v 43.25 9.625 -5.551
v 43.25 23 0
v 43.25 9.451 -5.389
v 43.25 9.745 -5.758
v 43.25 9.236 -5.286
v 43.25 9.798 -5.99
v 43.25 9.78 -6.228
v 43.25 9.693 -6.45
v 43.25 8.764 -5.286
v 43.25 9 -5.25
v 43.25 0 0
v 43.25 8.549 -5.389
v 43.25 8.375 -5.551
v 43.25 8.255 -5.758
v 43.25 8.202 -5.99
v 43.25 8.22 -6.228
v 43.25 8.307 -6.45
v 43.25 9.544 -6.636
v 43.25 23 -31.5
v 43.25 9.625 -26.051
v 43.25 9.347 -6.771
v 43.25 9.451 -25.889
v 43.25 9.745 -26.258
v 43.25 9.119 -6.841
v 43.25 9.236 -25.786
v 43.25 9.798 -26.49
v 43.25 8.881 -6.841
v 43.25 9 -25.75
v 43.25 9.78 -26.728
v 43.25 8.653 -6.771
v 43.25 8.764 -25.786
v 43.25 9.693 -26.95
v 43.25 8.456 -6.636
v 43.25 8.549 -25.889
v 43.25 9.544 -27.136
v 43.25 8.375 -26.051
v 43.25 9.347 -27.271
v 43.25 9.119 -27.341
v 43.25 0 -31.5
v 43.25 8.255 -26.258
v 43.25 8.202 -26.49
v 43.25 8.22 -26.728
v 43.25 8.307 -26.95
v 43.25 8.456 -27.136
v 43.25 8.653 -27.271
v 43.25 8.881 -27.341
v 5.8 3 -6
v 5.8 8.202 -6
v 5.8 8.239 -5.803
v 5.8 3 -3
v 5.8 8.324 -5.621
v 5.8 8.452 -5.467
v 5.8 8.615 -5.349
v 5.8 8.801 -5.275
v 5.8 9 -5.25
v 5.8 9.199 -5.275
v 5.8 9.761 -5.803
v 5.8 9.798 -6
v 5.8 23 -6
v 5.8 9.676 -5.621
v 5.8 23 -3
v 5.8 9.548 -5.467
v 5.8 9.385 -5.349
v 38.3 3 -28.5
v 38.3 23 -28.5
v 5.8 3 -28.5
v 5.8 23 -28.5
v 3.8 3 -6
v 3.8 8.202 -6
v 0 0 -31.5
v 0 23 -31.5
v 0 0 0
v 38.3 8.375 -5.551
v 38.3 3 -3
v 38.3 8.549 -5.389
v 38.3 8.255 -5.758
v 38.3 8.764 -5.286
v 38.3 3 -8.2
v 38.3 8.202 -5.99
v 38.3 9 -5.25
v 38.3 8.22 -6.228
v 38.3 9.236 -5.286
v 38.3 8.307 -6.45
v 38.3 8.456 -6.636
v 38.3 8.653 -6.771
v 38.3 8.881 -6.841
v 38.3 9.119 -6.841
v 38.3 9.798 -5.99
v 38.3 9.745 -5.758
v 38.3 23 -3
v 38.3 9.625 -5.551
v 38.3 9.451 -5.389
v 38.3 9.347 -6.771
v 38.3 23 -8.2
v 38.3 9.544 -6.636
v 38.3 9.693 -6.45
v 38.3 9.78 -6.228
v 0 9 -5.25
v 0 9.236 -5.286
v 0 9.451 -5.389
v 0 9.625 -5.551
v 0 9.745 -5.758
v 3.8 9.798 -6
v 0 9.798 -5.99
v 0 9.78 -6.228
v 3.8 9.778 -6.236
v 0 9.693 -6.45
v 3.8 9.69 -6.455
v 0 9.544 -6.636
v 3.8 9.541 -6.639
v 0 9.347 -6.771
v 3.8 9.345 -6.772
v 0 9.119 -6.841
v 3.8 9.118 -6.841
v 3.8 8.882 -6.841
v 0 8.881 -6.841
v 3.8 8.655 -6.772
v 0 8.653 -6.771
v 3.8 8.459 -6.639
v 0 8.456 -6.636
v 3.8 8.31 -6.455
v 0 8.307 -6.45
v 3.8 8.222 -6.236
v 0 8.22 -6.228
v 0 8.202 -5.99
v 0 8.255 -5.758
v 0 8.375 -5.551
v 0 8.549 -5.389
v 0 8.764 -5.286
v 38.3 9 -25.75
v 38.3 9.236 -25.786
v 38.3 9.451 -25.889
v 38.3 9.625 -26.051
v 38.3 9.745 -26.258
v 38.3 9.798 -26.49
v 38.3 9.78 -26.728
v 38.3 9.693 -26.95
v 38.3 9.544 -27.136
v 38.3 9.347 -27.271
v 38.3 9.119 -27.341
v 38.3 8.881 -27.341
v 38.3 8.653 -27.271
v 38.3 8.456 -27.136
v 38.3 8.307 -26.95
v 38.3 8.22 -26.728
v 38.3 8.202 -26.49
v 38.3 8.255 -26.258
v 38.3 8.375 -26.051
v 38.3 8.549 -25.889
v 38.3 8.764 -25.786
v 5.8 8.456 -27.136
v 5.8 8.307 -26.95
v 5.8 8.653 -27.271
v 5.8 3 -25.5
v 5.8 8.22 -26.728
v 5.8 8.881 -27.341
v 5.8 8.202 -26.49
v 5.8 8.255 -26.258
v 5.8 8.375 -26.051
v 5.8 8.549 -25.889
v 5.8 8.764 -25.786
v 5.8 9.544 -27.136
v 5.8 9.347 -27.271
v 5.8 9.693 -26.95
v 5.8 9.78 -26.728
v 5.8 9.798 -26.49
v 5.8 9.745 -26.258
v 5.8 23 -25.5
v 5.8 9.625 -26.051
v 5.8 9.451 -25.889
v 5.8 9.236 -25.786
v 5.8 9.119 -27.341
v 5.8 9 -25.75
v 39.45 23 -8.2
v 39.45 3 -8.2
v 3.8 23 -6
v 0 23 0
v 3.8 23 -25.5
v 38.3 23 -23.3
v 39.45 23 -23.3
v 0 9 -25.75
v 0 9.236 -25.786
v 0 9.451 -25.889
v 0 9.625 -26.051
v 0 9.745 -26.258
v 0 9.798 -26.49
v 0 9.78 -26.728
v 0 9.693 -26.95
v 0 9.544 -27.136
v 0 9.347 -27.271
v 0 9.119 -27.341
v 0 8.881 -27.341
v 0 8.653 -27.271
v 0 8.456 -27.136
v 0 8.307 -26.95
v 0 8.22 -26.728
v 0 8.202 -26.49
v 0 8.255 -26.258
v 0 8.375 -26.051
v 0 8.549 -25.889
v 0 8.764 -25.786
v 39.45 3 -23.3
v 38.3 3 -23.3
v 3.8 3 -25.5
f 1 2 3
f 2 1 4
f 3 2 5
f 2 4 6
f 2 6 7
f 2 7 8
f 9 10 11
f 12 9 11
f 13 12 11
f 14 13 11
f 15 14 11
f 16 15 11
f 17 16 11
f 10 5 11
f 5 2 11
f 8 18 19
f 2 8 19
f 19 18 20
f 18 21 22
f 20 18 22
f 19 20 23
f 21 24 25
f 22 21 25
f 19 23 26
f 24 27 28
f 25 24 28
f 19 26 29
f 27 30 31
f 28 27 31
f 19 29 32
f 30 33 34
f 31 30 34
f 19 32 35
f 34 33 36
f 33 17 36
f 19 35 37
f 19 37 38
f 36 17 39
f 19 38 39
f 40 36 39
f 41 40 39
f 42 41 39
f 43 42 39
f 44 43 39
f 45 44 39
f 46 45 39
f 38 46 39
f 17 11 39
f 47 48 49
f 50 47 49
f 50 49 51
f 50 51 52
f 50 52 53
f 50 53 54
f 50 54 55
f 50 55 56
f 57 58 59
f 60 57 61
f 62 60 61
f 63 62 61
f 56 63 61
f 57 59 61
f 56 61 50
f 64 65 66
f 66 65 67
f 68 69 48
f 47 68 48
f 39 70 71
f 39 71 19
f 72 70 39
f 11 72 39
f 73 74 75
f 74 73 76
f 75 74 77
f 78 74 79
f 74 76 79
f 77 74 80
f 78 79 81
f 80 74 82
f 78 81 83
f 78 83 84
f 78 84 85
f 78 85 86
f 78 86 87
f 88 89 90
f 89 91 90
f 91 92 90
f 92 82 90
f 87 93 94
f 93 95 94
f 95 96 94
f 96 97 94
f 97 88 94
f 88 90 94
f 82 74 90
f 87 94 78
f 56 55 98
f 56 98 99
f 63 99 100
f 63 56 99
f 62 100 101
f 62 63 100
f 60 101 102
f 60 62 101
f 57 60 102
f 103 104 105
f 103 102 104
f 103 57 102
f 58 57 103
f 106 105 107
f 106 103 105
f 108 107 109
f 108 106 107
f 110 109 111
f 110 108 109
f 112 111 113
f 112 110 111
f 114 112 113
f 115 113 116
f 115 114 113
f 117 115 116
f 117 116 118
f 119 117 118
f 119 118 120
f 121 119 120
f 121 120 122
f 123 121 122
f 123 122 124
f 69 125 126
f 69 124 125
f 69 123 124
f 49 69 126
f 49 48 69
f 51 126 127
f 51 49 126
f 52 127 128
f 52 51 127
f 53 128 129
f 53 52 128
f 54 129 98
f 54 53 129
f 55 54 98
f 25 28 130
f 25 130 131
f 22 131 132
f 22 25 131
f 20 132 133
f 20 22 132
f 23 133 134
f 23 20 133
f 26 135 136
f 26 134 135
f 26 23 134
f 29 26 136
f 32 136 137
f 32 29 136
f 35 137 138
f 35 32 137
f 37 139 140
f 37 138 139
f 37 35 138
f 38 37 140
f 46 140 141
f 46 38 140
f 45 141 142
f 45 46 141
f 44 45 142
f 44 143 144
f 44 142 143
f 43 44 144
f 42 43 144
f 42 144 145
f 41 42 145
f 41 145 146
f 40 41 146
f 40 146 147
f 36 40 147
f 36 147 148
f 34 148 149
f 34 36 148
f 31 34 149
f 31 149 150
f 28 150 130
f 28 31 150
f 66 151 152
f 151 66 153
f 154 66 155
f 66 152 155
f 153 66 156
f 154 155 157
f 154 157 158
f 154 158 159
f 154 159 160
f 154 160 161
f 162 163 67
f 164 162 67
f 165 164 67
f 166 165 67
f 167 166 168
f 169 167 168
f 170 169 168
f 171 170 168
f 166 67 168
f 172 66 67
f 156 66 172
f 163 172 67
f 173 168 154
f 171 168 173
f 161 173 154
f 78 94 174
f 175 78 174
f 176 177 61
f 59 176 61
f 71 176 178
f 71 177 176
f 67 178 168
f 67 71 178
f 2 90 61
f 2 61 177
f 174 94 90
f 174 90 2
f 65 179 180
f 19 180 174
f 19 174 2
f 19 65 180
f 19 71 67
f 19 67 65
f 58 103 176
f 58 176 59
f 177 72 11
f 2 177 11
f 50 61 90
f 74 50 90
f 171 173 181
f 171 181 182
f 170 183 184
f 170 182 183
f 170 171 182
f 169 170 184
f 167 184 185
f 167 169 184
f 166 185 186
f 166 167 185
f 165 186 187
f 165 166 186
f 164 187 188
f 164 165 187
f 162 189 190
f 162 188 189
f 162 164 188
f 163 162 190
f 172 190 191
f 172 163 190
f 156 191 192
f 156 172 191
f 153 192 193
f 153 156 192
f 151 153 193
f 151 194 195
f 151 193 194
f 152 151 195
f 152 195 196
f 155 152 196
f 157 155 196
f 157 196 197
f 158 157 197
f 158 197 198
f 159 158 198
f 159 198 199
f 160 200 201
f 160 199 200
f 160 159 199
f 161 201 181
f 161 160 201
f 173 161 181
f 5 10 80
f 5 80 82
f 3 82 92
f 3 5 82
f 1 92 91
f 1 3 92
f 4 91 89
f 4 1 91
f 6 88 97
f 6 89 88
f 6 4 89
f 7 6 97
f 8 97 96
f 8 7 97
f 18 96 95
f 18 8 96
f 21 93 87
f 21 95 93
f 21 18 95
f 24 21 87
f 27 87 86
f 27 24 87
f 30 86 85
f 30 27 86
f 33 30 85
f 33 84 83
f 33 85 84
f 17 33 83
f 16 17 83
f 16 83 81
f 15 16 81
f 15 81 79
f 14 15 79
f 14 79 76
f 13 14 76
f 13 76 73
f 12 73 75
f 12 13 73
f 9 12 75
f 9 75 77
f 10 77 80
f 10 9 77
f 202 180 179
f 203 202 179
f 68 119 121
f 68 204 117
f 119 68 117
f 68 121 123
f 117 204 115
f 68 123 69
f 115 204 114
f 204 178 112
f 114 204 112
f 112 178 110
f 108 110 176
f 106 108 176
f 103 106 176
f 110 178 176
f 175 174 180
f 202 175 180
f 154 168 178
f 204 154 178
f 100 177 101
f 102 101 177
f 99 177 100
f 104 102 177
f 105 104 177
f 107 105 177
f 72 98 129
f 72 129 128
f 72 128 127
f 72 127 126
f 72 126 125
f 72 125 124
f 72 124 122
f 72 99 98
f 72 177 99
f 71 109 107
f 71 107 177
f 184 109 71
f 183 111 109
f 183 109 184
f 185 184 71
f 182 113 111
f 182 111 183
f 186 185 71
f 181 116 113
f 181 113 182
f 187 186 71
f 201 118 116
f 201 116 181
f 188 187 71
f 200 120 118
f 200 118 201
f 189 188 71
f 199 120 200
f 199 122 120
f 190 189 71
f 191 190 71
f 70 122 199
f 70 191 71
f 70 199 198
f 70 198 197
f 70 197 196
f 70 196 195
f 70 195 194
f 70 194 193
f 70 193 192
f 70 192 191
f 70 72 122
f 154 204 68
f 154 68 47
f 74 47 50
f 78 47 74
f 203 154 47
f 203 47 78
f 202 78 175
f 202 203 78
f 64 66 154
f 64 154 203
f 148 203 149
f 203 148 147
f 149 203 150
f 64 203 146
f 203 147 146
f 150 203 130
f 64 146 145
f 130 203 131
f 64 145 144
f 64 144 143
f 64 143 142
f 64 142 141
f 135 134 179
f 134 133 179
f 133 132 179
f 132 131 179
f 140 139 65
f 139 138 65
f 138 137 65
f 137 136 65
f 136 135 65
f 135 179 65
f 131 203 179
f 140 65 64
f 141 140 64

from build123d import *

# Parameters (mm, degrees)
SKETCH1_W               = 43.25
SKETCH1_H               = 31.5
BOSS_EXTRUDE1_DEPTH     = 23
CUT_EXTRUDE1_DEPTH      = 20
CUT_EXTRUDE2_DEPTH      = 55.663882043
CUT_EXTRUDE2_DEPTH_BACK = 55.663882043
SKETCH3_R               = 0.8


with BuildPart() as part:
    # Sketch1 → Boss-Extrude1 (new body)
    with BuildSketch(Plane(origin=(0, 0, 0), x_dir=(1, 0, 0), z_dir=(0, 1, 0))):
        with Locations((21.625, 15.75)):
            Rectangle(SKETCH1_W, SKETCH1_H)
    extrude(amount=BOSS_EXTRUDE1_DEPTH)

    # Sketch2 → Cut-Extrude1 (cut)
    with BuildSketch(Plane(origin=(0, 23, 0), x_dir=(1, 0, 0), z_dir=(0, 1, 0))):
        Polygon((38.3, 28.5), (5.8, 28.5), (5.8, 25.5), (3.8, 25.5), (3.8, 6), (5.8, 6), (5.8, 3), (38.3, 3), (38.3, 8.2), (39.45, 8.2), (39.45, 23.3), (38.3, 23.3), align=None)
    extrude(amount=-CUT_EXTRUDE1_DEPTH, mode=Mode.SUBTRACT)

    # Sketch3 → Cut-Extrude2 (cut, two sides: drawn at the far end of the back side and taken through both)
    with BuildSketch(Plane.ZY.offset(-38.3).offset(-CUT_EXTRUDE2_DEPTH_BACK)):
        with Locations((-26.55, 9)):
            Circle(SKETCH3_R)
        with Locations((-6.05, 9)):
            Circle(SKETCH3_R)
    extrude(amount=CUT_EXTRUDE2_DEPTH + CUT_EXTRUDE2_DEPTH_BACK, mode=Mode.SUBTRACT)


solid = part.part
